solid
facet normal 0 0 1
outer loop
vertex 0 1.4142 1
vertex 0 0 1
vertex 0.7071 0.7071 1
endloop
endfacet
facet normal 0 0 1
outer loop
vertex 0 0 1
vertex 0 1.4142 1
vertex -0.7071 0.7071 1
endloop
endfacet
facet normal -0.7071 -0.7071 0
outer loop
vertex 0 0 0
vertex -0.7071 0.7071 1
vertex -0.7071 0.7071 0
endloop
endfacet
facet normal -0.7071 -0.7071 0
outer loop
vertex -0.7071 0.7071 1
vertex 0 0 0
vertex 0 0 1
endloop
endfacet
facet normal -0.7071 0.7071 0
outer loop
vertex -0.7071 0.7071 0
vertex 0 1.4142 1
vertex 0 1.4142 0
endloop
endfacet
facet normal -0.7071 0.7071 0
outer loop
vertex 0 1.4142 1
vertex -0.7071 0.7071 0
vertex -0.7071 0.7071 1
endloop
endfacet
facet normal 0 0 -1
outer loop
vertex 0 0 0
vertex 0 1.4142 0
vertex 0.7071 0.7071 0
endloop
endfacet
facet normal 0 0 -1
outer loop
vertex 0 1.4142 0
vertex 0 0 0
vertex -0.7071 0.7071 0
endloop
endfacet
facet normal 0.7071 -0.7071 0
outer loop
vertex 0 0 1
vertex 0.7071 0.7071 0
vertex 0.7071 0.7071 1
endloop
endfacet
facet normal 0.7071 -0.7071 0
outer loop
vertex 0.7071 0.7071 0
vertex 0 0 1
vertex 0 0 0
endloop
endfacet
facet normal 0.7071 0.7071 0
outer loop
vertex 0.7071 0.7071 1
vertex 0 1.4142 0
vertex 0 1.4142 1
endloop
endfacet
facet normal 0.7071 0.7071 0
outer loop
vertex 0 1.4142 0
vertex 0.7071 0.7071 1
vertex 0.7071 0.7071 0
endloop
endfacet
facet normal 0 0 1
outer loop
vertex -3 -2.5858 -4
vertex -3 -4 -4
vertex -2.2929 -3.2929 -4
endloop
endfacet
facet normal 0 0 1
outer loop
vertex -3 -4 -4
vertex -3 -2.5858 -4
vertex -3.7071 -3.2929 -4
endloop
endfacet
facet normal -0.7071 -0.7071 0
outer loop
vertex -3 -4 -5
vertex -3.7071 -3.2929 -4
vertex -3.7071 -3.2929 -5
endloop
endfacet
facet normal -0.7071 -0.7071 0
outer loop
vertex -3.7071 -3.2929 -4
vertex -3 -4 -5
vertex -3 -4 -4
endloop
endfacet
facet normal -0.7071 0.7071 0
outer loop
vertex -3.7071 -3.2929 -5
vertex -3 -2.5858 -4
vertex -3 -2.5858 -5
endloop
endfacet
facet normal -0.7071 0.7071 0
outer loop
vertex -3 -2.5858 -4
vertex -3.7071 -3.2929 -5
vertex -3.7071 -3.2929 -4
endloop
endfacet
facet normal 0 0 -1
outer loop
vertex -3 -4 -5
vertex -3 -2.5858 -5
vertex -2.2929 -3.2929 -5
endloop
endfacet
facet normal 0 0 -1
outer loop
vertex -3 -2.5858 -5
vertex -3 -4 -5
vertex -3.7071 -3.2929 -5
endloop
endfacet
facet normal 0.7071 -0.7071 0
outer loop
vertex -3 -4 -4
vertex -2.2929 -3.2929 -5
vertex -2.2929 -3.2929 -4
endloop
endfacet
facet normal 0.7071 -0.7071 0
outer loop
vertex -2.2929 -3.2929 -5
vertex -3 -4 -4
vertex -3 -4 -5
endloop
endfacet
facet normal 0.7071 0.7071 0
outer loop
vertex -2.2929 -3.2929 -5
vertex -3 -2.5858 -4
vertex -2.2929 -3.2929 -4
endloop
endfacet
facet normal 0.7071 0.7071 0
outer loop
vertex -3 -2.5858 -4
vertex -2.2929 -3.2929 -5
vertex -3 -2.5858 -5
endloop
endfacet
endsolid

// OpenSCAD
$fn=5;
union()
{
	translate([0,0,0])
	{
		rotate(45.000004,[0,0,1])
		{
			cube([1,1,1]);
		}
	}
	translate([-3,-4,-5])
	{
		rotate(45.000004,[0,0,1])
		{
			cube([1,1,1]);
		}
	}
}
